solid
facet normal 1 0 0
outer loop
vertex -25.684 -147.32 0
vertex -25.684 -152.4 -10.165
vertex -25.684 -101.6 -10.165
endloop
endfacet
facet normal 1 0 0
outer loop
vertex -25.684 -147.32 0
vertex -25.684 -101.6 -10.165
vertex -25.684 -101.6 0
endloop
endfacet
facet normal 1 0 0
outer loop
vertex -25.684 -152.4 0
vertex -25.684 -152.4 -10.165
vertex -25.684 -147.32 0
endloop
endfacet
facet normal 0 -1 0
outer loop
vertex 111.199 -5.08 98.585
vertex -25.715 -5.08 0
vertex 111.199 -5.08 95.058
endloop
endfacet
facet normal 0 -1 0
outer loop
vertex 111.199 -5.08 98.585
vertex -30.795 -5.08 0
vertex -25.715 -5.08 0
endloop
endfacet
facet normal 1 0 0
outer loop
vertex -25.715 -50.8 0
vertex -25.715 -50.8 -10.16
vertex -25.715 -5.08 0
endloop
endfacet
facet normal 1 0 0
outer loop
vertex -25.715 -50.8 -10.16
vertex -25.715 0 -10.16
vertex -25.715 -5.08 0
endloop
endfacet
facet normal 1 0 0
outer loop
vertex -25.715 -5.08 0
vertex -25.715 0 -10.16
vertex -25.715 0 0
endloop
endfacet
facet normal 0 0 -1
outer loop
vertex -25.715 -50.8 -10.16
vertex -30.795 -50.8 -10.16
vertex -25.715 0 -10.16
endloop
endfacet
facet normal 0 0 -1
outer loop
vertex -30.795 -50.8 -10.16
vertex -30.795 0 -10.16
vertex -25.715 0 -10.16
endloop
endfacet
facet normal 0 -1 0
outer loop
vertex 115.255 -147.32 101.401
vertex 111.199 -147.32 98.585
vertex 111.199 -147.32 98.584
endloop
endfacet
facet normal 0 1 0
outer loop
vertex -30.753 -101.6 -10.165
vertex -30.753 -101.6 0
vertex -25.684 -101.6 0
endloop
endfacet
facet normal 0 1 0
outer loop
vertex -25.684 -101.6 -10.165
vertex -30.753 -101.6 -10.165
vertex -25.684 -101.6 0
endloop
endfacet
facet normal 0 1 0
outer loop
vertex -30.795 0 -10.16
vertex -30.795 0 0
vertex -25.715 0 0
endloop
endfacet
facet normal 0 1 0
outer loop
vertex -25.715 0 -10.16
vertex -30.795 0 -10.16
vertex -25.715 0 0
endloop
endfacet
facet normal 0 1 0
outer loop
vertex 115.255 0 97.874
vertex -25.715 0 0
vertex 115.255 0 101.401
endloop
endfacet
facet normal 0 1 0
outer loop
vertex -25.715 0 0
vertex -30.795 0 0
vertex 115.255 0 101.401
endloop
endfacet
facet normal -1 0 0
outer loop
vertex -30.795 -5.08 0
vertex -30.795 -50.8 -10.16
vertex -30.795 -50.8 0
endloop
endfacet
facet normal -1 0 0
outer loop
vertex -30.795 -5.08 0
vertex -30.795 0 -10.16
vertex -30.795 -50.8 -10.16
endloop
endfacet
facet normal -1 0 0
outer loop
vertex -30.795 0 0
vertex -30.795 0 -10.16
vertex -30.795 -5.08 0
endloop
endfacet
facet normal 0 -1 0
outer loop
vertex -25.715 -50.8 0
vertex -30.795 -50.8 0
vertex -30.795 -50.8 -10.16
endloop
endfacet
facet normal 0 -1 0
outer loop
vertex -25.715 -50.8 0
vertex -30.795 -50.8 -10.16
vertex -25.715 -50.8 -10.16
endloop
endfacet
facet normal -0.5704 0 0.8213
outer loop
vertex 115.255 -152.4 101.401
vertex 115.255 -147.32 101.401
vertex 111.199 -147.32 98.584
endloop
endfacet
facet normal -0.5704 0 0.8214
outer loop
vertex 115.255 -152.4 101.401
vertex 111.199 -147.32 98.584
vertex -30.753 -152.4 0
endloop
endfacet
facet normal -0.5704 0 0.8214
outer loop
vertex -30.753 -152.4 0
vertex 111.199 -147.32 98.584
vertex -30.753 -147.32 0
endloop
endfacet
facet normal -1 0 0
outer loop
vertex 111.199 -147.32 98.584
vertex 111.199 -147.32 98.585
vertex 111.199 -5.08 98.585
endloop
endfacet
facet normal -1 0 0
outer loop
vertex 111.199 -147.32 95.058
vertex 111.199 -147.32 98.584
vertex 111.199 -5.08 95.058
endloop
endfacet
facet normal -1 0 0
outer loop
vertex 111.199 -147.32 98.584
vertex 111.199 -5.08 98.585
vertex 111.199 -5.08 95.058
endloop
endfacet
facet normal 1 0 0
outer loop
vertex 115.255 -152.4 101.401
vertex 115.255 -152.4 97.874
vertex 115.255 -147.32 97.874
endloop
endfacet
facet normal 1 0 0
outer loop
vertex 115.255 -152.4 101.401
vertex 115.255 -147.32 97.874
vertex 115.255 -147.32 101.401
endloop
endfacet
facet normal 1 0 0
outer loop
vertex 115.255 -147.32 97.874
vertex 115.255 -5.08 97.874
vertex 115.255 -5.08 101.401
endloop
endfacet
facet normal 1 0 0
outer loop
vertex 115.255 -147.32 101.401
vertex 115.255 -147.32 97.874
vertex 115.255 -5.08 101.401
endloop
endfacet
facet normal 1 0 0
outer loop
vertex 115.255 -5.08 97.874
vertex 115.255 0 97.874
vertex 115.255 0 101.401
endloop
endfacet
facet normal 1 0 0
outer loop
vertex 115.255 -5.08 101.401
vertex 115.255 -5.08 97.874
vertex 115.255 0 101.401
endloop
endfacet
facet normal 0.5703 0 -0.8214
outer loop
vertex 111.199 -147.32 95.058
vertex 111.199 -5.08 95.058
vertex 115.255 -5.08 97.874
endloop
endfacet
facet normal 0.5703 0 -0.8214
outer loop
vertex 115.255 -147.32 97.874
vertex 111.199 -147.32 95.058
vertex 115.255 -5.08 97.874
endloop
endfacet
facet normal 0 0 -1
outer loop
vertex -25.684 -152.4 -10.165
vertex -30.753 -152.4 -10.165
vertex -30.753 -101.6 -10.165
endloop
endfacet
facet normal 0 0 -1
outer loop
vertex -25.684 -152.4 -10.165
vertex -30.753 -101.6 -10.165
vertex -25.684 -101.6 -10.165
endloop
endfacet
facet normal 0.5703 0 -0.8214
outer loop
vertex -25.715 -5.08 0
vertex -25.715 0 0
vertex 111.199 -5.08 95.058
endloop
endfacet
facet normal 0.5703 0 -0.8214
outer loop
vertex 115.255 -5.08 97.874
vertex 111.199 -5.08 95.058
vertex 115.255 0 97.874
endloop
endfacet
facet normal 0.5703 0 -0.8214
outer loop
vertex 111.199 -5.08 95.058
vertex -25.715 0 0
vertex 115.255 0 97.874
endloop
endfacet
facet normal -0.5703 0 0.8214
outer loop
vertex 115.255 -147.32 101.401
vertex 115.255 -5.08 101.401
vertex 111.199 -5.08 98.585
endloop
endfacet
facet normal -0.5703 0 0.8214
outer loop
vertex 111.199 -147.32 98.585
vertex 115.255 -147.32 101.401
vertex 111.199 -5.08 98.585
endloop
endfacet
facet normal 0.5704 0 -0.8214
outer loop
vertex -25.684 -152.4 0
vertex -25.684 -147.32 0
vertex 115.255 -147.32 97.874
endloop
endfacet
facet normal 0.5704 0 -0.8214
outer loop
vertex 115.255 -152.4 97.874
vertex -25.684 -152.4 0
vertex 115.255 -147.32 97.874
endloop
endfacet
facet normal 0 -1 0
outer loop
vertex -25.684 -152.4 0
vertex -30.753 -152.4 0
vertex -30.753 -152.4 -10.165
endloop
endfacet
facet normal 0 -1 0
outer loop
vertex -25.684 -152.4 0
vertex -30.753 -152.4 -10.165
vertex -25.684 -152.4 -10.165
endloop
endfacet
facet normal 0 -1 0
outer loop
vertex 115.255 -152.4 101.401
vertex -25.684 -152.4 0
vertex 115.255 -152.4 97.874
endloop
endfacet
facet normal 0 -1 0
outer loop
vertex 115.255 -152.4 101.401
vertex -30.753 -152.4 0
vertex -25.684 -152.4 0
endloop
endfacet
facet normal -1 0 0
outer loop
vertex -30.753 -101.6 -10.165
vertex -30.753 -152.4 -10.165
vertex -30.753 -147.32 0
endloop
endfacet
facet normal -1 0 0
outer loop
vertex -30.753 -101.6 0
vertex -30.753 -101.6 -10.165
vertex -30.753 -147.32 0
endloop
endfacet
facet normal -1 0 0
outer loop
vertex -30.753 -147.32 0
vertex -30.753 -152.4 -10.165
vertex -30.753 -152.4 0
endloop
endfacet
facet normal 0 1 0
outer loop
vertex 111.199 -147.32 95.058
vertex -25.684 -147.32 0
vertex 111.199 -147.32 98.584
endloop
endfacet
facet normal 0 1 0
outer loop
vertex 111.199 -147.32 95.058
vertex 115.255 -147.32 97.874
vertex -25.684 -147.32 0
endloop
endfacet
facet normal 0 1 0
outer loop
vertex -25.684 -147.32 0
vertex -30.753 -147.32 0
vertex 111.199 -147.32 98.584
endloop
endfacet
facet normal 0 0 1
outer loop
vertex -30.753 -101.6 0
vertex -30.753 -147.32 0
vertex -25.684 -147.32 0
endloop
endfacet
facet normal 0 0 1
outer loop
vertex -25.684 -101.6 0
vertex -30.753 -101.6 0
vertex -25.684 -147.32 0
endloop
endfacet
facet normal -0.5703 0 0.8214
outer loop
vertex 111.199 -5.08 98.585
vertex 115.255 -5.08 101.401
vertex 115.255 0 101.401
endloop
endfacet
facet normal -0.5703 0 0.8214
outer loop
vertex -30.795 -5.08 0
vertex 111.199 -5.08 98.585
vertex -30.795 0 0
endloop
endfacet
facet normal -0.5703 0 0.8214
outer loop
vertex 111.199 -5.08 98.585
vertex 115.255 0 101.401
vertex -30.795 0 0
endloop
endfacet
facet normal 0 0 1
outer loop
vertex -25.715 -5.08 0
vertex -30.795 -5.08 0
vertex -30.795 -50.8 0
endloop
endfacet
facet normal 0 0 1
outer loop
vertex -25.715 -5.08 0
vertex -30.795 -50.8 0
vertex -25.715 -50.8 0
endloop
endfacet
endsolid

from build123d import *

# Parameters (mm, degrees)
F1_DEPTH = 5.08
F2_W     = 5.08
F2_H     = 10.16
F3_DEPTH = 45.72
F4_DEPTH = 142.24
F6_DEPTH = 5.08
F7_W     = 5.068376
F7_H     = 10.1649
F8_DEPTH = 50.8


with BuildPart() as f1:
    # F0 (on Front) → F1 (new body)
    with BuildSketch(Plane.XZ):
        Polygon((115.255311, 101.401368), (-30.794689, 0), (-30.794689, -10.16), (-25.714689, -10.16), (-25.714689, 0), (115.255311, 97.874364), align=None)
    extrude(amount=F1_DEPTH)

    # F2 (on face) → F3 (join)
    with BuildSketch(Plane.XZ.offset(5.08)):
        with Locations((-28.254689, -5.08)):
            Rectangle(F2_W, F2_H)
    extrude(amount=F3_DEPTH)

    # F2 (on face) → F4 (join)
    with BuildSketch(Plane.XZ.offset(5.08)):
        Polygon((115.255311, 101.401368), (111.198959, 98.585075), (111.198959, 95.058071), (115.255311, 97.874364), align=None)
    extrude(amount=F4_DEPTH)

    # F5 (on face) → F6 (join)
    with BuildSketch(Plane.XZ.offset(147.32)):
        Polygon((115.255311, 97.874364), (115.255311, 101.401368), (-30.752653, 0), (-30.752653, -10.1649), (-25.684277, -10.1649), (-25.684277, 0), align=None)
    extrude(amount=F6_DEPTH)

    # F7 (on face) → F8 (join)
    with BuildSketch(Plane.XZ.offset(152.4)):
        with Locations((-28.218465, -5.08245)):
            Rectangle(F7_W, F7_H)
    extrude(amount=-F8_DEPTH)


solid = f1.part
